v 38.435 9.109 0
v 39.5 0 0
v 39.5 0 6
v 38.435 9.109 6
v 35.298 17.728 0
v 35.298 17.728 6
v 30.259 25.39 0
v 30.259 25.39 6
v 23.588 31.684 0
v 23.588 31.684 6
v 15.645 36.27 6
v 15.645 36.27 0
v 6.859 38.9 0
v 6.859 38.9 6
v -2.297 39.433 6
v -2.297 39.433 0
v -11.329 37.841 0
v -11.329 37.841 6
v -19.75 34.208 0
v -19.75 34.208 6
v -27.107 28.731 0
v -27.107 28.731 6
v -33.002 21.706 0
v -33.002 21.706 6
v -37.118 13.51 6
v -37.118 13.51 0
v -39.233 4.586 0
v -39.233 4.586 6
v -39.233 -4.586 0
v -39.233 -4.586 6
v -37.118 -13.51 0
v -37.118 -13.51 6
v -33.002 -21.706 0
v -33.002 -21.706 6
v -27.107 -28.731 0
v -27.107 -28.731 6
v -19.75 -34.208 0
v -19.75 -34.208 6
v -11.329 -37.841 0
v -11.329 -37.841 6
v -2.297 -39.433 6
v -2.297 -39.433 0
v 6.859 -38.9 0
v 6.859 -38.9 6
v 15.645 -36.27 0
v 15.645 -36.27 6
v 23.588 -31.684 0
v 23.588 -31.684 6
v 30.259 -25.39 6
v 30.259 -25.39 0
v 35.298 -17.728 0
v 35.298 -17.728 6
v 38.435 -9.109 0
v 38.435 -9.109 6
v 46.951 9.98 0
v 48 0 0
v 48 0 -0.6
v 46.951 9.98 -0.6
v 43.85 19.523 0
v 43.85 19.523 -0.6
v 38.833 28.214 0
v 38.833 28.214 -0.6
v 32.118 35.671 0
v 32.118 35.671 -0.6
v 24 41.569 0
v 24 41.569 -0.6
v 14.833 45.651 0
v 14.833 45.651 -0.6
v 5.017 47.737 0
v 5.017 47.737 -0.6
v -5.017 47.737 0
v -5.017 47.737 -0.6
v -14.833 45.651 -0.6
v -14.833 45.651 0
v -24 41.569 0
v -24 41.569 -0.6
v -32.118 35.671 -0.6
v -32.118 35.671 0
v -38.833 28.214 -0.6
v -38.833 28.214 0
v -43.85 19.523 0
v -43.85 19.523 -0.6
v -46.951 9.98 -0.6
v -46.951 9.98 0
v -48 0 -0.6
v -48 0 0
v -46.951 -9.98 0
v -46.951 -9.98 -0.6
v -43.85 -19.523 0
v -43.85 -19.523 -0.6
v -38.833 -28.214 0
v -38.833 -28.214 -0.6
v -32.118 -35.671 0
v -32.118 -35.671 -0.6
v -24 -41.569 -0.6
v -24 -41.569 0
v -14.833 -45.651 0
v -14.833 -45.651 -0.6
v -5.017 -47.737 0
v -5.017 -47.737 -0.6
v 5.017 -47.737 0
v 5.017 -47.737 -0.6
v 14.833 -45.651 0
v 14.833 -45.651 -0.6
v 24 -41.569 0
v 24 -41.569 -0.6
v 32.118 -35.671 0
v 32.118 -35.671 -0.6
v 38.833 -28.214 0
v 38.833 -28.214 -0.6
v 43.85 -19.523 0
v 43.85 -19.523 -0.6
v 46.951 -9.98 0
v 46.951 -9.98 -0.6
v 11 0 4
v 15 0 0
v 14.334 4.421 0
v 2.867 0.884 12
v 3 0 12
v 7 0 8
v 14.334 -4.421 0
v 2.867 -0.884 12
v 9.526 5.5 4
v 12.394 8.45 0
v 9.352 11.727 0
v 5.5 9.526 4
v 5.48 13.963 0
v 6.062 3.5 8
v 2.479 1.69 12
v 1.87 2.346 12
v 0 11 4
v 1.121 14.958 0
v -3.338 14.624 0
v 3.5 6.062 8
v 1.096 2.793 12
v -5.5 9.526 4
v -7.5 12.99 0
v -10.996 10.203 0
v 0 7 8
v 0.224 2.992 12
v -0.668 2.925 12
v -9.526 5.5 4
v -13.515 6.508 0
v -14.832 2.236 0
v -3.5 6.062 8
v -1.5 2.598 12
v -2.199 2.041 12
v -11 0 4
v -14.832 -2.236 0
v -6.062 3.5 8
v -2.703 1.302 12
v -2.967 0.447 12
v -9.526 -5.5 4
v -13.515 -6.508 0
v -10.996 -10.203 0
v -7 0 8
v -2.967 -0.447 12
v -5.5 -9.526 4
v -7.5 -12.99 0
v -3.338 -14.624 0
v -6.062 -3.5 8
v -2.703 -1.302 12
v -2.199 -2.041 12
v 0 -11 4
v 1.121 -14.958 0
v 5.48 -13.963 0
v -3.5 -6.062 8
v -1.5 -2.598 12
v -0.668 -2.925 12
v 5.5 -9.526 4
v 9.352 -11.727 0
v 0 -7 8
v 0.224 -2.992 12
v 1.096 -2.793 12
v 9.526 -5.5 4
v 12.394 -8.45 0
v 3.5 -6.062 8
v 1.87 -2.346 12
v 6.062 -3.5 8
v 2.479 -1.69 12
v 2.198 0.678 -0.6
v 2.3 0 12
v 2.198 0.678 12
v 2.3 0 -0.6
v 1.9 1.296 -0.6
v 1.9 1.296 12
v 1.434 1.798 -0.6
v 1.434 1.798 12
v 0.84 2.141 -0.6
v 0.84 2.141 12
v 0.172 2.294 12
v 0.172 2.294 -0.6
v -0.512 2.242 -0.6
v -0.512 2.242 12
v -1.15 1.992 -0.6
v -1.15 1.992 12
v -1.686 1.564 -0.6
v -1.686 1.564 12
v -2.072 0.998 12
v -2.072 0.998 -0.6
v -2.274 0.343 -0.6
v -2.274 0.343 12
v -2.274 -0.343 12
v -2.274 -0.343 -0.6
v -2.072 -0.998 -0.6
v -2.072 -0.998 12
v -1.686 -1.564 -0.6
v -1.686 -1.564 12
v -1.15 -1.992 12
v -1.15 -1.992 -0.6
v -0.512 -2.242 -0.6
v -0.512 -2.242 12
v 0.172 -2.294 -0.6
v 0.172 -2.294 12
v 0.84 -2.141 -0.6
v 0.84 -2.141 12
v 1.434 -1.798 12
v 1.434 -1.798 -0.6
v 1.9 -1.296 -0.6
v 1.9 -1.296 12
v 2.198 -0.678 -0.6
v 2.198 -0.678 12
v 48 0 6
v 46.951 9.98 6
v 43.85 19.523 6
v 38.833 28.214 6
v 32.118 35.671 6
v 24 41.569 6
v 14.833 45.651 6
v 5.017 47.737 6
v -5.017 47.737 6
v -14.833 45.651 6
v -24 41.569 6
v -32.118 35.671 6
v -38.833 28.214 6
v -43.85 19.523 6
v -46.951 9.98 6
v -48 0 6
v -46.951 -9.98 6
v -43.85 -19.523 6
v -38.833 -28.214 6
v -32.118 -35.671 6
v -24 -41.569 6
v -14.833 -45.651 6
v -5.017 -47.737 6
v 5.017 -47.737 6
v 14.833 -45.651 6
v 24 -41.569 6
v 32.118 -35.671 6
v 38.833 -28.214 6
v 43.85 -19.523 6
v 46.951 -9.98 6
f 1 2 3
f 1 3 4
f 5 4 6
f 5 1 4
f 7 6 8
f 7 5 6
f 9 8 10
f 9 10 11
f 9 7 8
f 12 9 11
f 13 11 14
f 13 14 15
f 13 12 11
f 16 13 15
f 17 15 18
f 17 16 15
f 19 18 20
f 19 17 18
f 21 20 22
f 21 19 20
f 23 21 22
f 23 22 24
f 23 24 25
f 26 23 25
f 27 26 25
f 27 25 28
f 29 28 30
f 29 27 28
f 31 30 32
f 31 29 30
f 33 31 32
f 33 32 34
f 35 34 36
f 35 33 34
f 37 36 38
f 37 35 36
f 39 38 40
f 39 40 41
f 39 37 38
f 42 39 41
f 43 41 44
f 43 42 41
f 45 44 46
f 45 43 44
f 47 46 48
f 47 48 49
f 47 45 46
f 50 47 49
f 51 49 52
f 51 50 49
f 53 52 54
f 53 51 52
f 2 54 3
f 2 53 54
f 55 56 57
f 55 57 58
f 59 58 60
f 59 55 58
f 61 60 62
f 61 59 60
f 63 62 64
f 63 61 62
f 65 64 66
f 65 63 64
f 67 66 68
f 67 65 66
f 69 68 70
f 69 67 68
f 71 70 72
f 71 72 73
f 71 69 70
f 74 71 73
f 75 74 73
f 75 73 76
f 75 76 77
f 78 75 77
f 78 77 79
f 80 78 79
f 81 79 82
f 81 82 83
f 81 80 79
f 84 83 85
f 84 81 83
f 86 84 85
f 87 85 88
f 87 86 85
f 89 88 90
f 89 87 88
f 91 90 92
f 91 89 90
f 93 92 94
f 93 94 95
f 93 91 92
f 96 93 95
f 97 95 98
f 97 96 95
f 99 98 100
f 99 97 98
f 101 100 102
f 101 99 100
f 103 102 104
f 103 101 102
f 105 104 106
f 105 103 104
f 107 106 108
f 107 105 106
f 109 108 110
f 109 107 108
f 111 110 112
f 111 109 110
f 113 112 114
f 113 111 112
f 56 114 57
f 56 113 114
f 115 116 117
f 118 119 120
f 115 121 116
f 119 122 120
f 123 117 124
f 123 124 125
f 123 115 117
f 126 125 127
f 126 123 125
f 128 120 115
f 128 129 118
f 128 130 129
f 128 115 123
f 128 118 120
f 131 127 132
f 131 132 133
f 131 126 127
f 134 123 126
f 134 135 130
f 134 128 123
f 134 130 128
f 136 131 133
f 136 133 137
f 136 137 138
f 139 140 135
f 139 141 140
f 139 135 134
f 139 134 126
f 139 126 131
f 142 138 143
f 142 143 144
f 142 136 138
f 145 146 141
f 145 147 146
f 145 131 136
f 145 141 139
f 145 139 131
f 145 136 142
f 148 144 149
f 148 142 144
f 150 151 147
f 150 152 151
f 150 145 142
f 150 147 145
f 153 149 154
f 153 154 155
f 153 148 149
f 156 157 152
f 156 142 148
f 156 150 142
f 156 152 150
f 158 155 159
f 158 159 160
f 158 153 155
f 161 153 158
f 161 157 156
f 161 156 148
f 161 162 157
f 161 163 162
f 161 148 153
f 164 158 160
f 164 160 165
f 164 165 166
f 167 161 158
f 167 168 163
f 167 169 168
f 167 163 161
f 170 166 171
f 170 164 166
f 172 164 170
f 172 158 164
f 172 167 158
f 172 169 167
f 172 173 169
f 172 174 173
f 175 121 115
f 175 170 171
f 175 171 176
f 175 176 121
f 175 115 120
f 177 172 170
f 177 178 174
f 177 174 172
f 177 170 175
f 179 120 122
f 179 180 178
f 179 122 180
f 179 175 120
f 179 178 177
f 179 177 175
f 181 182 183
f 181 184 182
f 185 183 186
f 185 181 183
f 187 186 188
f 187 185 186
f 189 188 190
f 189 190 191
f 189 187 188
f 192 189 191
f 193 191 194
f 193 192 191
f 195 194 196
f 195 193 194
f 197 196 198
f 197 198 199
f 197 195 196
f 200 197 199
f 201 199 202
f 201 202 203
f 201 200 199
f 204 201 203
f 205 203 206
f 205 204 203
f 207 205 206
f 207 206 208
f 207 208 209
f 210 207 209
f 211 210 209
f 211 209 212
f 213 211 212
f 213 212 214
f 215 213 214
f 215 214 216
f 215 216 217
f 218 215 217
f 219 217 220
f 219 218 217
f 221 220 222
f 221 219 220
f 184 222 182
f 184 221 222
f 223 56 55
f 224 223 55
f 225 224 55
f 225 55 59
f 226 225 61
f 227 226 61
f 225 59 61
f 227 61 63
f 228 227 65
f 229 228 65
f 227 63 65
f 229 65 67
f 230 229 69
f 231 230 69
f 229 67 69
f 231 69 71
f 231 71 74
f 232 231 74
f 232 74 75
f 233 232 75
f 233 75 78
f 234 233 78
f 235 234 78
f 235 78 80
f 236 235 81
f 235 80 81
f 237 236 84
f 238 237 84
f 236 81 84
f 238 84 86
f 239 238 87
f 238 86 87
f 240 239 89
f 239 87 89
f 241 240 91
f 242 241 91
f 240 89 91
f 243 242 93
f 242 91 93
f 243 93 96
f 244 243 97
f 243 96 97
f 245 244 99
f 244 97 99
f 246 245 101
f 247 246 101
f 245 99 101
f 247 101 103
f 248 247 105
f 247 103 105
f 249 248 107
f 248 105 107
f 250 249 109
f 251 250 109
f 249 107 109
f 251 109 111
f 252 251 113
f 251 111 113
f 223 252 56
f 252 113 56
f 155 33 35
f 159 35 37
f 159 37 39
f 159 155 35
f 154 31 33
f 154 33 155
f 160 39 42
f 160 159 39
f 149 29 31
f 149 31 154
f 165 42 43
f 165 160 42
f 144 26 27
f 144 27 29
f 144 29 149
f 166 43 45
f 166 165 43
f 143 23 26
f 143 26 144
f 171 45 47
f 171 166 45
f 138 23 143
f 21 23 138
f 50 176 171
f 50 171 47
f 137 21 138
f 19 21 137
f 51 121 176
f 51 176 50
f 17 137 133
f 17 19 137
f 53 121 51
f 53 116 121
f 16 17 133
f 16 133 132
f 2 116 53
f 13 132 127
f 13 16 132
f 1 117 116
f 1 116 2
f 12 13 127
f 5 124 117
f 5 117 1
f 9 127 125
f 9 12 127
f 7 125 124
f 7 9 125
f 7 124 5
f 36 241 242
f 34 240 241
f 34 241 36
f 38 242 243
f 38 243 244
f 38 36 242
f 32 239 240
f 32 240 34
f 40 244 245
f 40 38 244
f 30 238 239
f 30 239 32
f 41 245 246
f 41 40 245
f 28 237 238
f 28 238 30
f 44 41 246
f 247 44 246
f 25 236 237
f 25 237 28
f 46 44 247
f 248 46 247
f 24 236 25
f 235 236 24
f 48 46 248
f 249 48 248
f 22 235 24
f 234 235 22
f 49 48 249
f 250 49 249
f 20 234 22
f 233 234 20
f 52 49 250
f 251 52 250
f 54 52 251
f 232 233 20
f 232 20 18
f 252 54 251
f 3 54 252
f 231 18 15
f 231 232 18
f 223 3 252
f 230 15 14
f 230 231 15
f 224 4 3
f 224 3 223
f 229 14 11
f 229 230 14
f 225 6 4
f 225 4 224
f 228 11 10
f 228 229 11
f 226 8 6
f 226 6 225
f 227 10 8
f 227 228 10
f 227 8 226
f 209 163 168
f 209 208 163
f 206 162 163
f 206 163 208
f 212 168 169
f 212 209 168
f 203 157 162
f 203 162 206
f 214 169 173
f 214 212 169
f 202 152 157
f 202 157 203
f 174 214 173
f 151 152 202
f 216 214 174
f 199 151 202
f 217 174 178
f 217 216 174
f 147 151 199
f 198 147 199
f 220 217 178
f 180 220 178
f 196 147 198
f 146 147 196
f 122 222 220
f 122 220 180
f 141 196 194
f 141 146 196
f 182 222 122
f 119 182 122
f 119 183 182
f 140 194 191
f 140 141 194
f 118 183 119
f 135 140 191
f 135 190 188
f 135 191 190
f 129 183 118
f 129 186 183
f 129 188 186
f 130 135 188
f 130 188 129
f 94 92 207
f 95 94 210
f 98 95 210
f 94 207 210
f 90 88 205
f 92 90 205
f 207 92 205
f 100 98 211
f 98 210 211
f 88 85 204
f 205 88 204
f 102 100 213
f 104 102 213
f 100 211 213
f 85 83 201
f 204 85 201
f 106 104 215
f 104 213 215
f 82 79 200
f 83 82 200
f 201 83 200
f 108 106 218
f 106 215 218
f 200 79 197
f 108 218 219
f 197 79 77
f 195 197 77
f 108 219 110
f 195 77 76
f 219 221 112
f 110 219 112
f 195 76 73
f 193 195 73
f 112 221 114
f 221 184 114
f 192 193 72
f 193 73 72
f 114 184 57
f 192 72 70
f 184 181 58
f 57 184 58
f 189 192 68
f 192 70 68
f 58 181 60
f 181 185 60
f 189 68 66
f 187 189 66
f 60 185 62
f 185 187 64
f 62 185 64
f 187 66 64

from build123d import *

# Parameters (mm, degrees)
F0_R     = 15
F0_R_2   = 2.3
F1_DEPTH = 12
F0_R_3   = 48
F0_R_4   = 39.5
F2_DEPTH = 0.6
F3_SIZE  = 11.99999
F4_DEPTH = 6


# Not quite as in the source:
# - a fillet or chamfer is up to 0.001 mm smaller than in the source, because OpenCascade refuses the exact size


with BuildPart() as f1:
    # F0 (on Top) → F1 (new body)
    with BuildSketch(Plane.XY):
        Circle(F0_R)
        Circle(F0_R_2, mode=Mode.SUBTRACT)
    extrude(amount=F1_DEPTH)

    # F0 (on Top) → F2 (join)
    with BuildSketch(Plane.XY):
        Circle(F0_R_3)
        Circle(F0_R_4, mode=Mode.SUBTRACT)
        Circle(F0_R_4)
        Circle(F0_R, mode=Mode.SUBTRACT)
        Circle(F0_R)
        Circle(F0_R_2, mode=Mode.SUBTRACT)
    extrude(amount=-F2_DEPTH)

    # F3 (size 12 in the source; OpenCascade refuses exactly that, so slightly less here)
    f3_edges = [f1.edges().sort_by_distance(p)[0] for p in [
        (-15, 0, 12),
    ]]
    chamfer(f3_edges, length=F3_SIZE)

    # F0 (on Top) → F4 (join)
    with BuildSketch(Plane.XY):
        Circle(F0_R_3)
        Circle(F0_R_4, mode=Mode.SUBTRACT)
    extrude(amount=F4_DEPTH)


solid = f1.part
